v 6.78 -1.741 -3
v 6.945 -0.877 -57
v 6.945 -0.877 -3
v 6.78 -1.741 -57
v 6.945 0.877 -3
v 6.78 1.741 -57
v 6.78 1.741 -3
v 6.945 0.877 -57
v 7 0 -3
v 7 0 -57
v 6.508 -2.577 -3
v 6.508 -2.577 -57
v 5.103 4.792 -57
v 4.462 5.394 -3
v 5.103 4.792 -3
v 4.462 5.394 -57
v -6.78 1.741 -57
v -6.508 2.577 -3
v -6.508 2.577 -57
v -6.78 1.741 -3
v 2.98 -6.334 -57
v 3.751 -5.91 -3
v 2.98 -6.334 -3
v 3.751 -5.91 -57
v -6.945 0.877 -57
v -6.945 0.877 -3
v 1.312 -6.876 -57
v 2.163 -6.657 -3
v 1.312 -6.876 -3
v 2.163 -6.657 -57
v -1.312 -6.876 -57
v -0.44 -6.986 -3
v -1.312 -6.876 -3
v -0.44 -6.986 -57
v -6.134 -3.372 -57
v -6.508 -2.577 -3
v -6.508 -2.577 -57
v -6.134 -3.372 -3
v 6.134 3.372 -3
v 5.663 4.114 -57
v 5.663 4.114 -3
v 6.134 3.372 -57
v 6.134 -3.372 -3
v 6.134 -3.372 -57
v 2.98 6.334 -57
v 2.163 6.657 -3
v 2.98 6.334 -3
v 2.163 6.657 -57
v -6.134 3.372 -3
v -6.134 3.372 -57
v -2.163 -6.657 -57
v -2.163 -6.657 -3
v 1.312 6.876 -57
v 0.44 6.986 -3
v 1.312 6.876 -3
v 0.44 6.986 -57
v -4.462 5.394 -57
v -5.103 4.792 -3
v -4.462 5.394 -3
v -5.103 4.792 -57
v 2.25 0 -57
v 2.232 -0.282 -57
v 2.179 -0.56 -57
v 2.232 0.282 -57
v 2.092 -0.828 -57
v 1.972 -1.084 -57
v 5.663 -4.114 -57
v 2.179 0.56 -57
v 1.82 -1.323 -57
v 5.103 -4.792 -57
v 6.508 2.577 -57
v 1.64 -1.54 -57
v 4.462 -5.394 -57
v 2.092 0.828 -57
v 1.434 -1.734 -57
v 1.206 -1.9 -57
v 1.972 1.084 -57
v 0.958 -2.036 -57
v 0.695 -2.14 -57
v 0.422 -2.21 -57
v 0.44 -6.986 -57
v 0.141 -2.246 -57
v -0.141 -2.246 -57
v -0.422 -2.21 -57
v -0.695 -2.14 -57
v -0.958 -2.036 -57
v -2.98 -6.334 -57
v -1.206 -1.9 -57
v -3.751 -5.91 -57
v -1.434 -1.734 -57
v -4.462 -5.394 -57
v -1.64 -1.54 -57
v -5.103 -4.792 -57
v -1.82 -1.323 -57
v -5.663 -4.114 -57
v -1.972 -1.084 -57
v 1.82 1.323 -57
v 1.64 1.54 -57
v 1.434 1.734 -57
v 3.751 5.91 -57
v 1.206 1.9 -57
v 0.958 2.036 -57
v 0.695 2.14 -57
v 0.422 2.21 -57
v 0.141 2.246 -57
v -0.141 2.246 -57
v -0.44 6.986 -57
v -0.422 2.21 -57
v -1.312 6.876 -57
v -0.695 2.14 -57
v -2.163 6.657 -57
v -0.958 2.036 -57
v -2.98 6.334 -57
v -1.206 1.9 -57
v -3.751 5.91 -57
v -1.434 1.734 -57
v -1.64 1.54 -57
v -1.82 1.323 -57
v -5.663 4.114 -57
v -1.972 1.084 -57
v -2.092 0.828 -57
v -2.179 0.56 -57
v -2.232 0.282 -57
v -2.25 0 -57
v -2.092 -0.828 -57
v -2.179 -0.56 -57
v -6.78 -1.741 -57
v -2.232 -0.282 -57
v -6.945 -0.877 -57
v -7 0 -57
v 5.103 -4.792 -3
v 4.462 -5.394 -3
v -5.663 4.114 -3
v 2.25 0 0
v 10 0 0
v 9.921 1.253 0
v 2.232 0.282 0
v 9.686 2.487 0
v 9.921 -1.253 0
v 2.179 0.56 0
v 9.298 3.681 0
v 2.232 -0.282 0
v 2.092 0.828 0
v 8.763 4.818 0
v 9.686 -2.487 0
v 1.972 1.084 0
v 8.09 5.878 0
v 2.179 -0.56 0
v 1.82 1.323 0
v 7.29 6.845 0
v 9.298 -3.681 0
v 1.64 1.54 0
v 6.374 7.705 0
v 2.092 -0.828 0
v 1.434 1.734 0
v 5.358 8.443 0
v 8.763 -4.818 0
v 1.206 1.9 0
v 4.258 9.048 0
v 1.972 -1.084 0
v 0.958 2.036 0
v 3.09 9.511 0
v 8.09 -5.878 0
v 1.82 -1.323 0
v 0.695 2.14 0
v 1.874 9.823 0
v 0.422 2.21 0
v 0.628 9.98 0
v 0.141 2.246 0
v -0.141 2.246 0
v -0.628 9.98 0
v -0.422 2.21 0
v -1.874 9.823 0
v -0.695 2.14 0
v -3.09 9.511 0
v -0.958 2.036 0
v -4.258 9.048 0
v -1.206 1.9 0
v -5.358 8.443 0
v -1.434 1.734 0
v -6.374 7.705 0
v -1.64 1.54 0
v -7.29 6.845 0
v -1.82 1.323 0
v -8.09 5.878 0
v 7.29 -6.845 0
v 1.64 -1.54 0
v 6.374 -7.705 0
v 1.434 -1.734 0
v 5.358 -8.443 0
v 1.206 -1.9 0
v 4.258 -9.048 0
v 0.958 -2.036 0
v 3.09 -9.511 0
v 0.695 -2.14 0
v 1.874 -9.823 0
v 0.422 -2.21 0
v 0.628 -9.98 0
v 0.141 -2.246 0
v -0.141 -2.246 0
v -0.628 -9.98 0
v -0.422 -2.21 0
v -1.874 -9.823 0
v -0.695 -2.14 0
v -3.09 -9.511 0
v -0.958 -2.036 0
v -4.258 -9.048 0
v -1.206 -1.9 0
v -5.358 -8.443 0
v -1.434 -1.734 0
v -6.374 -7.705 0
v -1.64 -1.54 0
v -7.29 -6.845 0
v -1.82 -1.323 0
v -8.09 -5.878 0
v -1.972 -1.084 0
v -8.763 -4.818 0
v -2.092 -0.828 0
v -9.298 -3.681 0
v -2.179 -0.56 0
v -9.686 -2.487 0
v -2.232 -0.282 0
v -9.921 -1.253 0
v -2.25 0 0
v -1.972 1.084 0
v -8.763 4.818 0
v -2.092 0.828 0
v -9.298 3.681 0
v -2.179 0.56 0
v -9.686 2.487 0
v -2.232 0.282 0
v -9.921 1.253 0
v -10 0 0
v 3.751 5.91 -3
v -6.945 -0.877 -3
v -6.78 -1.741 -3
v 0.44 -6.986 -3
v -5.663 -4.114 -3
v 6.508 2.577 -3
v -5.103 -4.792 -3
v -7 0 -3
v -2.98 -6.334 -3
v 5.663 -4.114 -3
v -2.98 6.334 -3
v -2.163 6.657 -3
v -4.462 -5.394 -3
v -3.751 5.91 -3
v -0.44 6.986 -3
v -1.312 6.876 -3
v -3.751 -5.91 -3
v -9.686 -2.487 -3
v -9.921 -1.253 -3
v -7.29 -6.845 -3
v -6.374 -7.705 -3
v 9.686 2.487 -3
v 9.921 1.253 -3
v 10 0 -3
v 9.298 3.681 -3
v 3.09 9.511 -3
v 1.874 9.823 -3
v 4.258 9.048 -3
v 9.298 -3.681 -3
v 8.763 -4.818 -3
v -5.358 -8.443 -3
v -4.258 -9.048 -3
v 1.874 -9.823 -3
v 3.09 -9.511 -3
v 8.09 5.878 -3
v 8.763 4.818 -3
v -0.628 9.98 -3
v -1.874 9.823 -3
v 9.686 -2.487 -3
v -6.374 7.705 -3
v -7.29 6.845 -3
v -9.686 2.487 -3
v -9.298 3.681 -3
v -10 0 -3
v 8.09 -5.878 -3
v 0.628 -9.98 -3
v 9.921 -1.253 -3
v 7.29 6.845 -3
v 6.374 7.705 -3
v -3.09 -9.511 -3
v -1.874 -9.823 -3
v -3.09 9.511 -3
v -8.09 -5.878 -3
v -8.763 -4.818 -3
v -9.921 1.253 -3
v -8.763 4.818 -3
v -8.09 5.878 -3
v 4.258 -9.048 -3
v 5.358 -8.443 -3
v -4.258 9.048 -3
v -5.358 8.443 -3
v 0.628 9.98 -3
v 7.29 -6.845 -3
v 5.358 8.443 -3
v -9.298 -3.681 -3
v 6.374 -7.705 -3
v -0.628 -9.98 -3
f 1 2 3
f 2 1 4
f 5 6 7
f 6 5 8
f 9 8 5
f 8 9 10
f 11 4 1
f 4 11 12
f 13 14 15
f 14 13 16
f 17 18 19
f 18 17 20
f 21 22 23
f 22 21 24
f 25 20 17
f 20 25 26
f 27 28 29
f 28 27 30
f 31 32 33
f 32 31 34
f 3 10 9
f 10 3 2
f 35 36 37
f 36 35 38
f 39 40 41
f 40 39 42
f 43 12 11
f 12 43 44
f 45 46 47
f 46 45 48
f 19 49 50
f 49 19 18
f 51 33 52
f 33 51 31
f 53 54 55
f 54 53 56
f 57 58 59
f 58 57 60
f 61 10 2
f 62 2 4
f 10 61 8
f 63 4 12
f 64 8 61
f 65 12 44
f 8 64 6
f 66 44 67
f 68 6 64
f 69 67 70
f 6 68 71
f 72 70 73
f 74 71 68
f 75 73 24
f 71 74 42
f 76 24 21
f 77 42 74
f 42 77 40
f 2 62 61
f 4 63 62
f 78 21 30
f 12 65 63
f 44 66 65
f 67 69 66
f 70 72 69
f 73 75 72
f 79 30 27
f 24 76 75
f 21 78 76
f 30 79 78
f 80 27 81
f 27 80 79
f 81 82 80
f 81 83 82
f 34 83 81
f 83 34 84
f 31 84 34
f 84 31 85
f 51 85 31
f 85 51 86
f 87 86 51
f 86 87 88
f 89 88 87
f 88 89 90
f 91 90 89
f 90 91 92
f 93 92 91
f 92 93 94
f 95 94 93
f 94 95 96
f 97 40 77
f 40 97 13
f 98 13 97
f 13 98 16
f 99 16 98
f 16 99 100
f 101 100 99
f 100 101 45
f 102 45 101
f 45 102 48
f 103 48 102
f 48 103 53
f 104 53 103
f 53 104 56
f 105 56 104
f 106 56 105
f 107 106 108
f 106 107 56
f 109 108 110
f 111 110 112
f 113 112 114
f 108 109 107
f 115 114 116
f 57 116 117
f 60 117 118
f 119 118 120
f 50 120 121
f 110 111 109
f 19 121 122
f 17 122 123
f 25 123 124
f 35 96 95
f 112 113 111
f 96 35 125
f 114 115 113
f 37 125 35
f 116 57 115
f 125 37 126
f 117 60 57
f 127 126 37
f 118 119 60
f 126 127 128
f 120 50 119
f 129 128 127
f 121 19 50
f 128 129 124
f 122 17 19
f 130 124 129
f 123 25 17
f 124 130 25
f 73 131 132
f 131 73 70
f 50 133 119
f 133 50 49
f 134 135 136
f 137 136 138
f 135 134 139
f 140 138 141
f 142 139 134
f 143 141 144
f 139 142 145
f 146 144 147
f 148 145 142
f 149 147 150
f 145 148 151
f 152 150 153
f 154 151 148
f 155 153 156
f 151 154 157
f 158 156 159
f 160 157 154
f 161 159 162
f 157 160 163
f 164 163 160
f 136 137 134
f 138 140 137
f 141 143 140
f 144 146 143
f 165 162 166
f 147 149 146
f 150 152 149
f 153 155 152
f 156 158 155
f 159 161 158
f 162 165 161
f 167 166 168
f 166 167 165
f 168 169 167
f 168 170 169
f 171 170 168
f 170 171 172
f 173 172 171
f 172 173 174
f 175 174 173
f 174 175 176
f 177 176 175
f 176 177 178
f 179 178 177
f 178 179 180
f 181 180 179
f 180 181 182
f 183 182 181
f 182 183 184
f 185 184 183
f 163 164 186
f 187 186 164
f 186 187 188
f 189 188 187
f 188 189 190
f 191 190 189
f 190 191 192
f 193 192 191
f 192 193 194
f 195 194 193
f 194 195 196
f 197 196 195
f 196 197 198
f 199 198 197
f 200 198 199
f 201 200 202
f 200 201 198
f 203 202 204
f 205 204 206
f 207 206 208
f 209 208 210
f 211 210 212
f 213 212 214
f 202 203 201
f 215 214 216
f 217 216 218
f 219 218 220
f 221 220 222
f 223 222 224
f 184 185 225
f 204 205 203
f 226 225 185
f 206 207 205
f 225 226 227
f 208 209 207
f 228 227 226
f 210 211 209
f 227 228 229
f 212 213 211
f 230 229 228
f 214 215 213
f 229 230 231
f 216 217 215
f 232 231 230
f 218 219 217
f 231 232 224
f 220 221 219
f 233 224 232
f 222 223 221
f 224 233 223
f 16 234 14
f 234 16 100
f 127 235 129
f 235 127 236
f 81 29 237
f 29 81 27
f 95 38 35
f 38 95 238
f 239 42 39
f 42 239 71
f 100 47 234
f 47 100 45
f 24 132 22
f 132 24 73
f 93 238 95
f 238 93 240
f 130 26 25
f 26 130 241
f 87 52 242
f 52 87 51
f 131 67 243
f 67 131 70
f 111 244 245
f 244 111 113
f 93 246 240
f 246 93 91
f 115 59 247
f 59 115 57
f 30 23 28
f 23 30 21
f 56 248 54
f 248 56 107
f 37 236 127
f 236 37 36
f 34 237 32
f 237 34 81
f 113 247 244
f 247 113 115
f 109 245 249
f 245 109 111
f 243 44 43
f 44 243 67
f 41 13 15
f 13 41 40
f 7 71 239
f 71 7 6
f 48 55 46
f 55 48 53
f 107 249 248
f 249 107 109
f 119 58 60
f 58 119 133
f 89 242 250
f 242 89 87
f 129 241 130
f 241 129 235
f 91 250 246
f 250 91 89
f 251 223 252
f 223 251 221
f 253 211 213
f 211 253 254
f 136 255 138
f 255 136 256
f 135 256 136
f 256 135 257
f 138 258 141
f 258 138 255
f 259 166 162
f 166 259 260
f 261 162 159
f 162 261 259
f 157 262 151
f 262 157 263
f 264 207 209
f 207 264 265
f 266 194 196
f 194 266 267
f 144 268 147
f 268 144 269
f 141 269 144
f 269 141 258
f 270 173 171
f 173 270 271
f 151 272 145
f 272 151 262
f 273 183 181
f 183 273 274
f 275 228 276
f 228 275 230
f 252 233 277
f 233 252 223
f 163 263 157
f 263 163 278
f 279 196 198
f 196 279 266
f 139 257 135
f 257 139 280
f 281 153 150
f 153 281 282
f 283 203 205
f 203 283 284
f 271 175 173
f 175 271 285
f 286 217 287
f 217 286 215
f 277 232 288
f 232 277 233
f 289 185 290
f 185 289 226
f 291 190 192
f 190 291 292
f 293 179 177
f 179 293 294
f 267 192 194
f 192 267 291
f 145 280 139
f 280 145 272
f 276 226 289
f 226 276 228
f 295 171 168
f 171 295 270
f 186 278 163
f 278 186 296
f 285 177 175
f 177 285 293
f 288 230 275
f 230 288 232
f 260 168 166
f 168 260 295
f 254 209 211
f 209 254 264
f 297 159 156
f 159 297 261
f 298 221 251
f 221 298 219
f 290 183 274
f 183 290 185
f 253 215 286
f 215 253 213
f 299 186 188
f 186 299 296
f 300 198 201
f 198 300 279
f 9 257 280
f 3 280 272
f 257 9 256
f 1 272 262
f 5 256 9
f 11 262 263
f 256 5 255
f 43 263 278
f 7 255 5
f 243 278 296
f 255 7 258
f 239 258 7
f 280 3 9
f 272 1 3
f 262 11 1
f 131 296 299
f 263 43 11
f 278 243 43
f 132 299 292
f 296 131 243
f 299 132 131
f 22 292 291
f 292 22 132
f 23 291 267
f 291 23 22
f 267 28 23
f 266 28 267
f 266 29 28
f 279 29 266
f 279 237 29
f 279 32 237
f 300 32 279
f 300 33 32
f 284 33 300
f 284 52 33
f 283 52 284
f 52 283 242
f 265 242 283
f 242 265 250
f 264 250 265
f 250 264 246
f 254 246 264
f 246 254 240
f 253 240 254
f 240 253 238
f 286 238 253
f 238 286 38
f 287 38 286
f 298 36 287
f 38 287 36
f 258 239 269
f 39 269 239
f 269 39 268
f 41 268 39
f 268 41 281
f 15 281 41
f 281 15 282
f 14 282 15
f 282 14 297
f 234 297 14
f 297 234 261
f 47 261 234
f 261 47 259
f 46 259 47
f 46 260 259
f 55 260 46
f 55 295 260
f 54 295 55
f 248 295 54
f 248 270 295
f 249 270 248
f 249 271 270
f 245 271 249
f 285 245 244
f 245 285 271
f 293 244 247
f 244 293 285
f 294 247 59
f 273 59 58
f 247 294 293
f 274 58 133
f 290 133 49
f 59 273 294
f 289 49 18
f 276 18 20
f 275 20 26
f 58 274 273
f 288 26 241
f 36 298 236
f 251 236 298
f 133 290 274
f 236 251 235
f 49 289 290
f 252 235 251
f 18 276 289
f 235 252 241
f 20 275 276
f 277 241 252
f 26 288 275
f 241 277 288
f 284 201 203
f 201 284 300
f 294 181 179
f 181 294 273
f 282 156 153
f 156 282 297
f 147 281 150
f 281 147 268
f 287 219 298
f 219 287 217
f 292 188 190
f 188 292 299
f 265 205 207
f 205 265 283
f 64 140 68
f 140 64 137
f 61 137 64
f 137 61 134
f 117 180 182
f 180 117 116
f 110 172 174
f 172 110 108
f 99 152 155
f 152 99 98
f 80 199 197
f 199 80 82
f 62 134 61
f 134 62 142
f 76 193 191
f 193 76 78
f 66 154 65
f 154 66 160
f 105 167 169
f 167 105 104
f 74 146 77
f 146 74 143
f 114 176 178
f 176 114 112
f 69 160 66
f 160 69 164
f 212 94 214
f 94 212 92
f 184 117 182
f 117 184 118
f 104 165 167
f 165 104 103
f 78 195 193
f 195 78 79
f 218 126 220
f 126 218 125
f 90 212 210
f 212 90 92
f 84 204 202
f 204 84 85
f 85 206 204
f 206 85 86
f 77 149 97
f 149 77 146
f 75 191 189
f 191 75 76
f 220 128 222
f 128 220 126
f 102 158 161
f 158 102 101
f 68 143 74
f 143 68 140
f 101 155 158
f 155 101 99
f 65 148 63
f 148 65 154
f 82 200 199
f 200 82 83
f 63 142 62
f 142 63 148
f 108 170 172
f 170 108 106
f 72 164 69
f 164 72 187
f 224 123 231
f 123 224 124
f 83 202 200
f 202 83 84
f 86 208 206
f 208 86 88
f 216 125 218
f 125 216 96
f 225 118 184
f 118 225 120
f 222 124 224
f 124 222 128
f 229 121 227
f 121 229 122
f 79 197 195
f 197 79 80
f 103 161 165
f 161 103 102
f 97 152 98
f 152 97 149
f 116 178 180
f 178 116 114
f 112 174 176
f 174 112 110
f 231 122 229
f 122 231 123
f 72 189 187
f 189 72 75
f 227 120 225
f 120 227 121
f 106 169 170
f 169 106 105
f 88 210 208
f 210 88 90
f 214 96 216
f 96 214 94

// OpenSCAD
$fn = 50;


difference() {
	union() {
		translate(v = [0, 0, -57.0000000000]) {
			cylinder(h = 57, r = 7.0000000000);
		}
		translate(v = [0, 0, -3.0000000000]) {
			cylinder(h = 3, r = 10.0000000000);
		}
	}
	union() {
		#translate(v = [0, 0, -57]) {
			cylinder(h = 57, r = 2.2500000000);
		}
	}
}
